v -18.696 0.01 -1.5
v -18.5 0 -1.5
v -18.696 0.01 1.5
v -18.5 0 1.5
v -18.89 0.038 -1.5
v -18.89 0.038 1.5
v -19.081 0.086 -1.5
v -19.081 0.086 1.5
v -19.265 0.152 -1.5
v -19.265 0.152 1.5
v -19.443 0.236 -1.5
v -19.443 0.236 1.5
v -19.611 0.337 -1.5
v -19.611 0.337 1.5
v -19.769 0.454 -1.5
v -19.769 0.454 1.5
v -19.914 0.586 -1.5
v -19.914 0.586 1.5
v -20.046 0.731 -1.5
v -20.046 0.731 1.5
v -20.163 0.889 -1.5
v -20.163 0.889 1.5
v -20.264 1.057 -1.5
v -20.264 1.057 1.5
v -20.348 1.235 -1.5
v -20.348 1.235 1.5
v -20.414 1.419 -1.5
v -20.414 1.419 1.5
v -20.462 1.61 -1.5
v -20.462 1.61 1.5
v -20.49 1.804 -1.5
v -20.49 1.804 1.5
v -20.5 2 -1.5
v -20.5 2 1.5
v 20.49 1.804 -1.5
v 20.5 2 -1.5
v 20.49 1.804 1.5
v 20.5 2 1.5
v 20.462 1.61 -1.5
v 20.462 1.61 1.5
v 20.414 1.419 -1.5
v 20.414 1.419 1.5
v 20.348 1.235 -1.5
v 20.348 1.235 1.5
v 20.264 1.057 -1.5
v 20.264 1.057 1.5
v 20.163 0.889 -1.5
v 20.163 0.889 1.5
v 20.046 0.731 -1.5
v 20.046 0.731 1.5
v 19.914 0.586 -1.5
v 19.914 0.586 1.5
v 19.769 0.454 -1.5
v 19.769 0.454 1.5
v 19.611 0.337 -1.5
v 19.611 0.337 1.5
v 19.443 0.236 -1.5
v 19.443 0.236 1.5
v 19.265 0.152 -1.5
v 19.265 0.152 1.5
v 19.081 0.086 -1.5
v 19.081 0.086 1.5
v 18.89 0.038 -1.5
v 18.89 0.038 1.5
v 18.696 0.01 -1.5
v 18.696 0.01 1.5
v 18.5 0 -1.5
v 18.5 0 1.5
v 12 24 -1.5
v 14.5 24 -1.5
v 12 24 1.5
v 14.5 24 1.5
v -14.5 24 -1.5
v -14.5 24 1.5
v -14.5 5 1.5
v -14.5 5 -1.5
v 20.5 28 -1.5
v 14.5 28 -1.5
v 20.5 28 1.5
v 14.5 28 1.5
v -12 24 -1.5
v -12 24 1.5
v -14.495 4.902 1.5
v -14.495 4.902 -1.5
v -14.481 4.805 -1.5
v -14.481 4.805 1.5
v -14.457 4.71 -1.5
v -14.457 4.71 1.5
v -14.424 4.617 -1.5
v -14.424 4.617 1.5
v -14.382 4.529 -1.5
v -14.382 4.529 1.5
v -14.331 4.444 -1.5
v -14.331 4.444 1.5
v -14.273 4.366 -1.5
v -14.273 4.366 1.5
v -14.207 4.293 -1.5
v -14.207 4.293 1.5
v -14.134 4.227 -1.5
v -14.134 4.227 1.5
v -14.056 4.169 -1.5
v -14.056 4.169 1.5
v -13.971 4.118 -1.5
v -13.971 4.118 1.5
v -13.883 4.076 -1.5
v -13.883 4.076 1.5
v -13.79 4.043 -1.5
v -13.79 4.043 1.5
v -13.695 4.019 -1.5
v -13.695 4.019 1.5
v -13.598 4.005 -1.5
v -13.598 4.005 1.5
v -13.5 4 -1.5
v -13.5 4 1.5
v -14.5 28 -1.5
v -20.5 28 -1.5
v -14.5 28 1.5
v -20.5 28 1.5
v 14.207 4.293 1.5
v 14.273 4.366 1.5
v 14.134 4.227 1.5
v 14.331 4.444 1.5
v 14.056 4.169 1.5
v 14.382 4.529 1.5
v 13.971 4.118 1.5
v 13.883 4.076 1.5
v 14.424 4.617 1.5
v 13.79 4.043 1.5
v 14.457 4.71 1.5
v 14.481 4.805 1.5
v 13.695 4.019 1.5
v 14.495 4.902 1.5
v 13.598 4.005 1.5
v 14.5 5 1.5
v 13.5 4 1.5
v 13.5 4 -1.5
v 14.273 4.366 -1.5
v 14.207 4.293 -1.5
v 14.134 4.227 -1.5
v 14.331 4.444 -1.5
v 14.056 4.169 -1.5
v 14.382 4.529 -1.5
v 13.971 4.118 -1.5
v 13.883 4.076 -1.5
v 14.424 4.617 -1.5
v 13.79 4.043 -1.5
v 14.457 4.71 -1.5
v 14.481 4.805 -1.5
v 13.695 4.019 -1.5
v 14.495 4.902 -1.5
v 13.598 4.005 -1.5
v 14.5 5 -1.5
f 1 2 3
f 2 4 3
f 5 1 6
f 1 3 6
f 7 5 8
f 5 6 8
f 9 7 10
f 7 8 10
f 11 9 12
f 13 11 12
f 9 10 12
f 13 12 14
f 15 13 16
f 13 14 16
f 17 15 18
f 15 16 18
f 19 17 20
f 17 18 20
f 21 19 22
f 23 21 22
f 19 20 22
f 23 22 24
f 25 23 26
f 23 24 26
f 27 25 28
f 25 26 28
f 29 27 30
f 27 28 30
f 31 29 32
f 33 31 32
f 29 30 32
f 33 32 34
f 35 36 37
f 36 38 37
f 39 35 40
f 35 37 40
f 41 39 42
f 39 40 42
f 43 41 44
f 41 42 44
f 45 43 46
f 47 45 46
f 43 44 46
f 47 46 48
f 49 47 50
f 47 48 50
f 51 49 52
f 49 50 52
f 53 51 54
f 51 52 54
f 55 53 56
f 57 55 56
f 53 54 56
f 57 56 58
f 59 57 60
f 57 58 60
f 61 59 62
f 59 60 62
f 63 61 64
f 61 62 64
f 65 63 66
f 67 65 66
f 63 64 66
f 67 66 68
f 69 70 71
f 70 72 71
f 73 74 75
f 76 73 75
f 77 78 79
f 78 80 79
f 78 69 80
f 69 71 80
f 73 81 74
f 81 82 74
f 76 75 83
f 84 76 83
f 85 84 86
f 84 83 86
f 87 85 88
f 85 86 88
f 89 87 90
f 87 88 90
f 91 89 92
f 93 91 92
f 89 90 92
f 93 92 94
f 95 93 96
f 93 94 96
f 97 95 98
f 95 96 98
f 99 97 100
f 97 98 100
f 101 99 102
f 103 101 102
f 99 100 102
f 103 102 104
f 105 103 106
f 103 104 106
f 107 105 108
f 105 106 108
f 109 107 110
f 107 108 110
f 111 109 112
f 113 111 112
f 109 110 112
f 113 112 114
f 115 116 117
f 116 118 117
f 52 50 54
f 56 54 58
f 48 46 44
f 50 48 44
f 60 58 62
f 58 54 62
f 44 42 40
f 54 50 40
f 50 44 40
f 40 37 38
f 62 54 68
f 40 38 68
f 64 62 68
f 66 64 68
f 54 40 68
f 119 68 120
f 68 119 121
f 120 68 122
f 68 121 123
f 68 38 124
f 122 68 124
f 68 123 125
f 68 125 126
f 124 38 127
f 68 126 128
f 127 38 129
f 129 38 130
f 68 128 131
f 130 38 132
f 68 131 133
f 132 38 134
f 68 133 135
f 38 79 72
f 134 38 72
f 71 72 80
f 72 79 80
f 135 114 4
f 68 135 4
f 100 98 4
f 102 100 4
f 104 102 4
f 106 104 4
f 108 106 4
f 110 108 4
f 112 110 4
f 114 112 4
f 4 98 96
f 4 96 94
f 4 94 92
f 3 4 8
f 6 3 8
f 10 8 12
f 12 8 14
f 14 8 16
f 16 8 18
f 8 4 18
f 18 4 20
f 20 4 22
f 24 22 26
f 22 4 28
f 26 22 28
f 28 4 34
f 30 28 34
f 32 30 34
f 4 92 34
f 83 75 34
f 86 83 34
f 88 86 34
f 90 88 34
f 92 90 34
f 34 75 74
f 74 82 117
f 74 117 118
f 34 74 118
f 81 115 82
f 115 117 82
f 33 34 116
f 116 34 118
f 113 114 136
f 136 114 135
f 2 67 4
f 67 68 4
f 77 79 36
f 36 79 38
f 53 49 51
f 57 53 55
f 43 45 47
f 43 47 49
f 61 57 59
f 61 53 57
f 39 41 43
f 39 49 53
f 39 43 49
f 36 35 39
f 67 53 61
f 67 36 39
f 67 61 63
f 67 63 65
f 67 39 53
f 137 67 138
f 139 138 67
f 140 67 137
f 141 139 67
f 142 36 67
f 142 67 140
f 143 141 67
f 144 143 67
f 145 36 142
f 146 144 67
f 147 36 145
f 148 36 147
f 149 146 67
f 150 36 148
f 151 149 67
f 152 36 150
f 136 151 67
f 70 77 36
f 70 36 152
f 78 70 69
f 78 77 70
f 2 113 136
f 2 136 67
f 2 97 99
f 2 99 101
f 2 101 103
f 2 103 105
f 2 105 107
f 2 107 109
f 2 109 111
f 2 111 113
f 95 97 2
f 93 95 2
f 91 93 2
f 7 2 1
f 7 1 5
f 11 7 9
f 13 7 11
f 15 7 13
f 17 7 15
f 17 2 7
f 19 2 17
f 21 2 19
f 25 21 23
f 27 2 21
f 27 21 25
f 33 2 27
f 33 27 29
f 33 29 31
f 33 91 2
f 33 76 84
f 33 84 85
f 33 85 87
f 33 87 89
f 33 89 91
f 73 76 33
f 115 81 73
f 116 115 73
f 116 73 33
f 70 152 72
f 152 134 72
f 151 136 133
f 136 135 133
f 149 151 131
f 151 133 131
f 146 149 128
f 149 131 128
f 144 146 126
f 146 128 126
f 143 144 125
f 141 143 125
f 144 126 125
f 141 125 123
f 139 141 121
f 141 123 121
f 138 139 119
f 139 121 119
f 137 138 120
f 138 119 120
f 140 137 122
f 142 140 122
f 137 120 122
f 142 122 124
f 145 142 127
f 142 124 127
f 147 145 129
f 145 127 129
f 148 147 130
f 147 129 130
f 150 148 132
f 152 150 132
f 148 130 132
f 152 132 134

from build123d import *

# Parameters (mm, degrees)
BOSS_EXTRUDE1_DEPTH = 1.5


with BuildPart() as part:
    # Sketch1 → Boss-Extrude1 (new, symmetric)
    with BuildSketch(Plane.XY):
        with BuildLine():
            Line((-13.5, 4), (13.5, 4))
            ThreePointArc((13.5, 4), (14.207106781, 4.292893219), (14.5, 5))
            Line((14.5, 5), (14.5, 24))
            Line((14.5, 24), (12, 24))
            Line((12, 24), (14.5, 28))
            Line((14.5, 28), (20.5, 28))
            Line((20.5, 28), (20.5, 2))
            ThreePointArc((20.5, 2), (19.914213562, 0.585786438), (18.5, 0))
            Line((18.5, 0), (-18.5, 0))
            ThreePointArc((-18.5, 0), (-19.914213562, 0.585786438), (-20.5, 2))
            Line((-20.5, 2), (-20.5, 28))
            Line((-20.5, 28), (-14.5, 28))
            Line((-14.5, 28), (-12, 24))
            Line((-12, 24), (-14.5, 24))
            Line((-14.5, 24), (-14.5, 5))
            ThreePointArc((-14.5, 5), (-14.207106781, 4.292893219), (-13.5, 4))
        make_face()
    extrude(amount=BOSS_EXTRUDE1_DEPTH, both=True)


solid = part.part
